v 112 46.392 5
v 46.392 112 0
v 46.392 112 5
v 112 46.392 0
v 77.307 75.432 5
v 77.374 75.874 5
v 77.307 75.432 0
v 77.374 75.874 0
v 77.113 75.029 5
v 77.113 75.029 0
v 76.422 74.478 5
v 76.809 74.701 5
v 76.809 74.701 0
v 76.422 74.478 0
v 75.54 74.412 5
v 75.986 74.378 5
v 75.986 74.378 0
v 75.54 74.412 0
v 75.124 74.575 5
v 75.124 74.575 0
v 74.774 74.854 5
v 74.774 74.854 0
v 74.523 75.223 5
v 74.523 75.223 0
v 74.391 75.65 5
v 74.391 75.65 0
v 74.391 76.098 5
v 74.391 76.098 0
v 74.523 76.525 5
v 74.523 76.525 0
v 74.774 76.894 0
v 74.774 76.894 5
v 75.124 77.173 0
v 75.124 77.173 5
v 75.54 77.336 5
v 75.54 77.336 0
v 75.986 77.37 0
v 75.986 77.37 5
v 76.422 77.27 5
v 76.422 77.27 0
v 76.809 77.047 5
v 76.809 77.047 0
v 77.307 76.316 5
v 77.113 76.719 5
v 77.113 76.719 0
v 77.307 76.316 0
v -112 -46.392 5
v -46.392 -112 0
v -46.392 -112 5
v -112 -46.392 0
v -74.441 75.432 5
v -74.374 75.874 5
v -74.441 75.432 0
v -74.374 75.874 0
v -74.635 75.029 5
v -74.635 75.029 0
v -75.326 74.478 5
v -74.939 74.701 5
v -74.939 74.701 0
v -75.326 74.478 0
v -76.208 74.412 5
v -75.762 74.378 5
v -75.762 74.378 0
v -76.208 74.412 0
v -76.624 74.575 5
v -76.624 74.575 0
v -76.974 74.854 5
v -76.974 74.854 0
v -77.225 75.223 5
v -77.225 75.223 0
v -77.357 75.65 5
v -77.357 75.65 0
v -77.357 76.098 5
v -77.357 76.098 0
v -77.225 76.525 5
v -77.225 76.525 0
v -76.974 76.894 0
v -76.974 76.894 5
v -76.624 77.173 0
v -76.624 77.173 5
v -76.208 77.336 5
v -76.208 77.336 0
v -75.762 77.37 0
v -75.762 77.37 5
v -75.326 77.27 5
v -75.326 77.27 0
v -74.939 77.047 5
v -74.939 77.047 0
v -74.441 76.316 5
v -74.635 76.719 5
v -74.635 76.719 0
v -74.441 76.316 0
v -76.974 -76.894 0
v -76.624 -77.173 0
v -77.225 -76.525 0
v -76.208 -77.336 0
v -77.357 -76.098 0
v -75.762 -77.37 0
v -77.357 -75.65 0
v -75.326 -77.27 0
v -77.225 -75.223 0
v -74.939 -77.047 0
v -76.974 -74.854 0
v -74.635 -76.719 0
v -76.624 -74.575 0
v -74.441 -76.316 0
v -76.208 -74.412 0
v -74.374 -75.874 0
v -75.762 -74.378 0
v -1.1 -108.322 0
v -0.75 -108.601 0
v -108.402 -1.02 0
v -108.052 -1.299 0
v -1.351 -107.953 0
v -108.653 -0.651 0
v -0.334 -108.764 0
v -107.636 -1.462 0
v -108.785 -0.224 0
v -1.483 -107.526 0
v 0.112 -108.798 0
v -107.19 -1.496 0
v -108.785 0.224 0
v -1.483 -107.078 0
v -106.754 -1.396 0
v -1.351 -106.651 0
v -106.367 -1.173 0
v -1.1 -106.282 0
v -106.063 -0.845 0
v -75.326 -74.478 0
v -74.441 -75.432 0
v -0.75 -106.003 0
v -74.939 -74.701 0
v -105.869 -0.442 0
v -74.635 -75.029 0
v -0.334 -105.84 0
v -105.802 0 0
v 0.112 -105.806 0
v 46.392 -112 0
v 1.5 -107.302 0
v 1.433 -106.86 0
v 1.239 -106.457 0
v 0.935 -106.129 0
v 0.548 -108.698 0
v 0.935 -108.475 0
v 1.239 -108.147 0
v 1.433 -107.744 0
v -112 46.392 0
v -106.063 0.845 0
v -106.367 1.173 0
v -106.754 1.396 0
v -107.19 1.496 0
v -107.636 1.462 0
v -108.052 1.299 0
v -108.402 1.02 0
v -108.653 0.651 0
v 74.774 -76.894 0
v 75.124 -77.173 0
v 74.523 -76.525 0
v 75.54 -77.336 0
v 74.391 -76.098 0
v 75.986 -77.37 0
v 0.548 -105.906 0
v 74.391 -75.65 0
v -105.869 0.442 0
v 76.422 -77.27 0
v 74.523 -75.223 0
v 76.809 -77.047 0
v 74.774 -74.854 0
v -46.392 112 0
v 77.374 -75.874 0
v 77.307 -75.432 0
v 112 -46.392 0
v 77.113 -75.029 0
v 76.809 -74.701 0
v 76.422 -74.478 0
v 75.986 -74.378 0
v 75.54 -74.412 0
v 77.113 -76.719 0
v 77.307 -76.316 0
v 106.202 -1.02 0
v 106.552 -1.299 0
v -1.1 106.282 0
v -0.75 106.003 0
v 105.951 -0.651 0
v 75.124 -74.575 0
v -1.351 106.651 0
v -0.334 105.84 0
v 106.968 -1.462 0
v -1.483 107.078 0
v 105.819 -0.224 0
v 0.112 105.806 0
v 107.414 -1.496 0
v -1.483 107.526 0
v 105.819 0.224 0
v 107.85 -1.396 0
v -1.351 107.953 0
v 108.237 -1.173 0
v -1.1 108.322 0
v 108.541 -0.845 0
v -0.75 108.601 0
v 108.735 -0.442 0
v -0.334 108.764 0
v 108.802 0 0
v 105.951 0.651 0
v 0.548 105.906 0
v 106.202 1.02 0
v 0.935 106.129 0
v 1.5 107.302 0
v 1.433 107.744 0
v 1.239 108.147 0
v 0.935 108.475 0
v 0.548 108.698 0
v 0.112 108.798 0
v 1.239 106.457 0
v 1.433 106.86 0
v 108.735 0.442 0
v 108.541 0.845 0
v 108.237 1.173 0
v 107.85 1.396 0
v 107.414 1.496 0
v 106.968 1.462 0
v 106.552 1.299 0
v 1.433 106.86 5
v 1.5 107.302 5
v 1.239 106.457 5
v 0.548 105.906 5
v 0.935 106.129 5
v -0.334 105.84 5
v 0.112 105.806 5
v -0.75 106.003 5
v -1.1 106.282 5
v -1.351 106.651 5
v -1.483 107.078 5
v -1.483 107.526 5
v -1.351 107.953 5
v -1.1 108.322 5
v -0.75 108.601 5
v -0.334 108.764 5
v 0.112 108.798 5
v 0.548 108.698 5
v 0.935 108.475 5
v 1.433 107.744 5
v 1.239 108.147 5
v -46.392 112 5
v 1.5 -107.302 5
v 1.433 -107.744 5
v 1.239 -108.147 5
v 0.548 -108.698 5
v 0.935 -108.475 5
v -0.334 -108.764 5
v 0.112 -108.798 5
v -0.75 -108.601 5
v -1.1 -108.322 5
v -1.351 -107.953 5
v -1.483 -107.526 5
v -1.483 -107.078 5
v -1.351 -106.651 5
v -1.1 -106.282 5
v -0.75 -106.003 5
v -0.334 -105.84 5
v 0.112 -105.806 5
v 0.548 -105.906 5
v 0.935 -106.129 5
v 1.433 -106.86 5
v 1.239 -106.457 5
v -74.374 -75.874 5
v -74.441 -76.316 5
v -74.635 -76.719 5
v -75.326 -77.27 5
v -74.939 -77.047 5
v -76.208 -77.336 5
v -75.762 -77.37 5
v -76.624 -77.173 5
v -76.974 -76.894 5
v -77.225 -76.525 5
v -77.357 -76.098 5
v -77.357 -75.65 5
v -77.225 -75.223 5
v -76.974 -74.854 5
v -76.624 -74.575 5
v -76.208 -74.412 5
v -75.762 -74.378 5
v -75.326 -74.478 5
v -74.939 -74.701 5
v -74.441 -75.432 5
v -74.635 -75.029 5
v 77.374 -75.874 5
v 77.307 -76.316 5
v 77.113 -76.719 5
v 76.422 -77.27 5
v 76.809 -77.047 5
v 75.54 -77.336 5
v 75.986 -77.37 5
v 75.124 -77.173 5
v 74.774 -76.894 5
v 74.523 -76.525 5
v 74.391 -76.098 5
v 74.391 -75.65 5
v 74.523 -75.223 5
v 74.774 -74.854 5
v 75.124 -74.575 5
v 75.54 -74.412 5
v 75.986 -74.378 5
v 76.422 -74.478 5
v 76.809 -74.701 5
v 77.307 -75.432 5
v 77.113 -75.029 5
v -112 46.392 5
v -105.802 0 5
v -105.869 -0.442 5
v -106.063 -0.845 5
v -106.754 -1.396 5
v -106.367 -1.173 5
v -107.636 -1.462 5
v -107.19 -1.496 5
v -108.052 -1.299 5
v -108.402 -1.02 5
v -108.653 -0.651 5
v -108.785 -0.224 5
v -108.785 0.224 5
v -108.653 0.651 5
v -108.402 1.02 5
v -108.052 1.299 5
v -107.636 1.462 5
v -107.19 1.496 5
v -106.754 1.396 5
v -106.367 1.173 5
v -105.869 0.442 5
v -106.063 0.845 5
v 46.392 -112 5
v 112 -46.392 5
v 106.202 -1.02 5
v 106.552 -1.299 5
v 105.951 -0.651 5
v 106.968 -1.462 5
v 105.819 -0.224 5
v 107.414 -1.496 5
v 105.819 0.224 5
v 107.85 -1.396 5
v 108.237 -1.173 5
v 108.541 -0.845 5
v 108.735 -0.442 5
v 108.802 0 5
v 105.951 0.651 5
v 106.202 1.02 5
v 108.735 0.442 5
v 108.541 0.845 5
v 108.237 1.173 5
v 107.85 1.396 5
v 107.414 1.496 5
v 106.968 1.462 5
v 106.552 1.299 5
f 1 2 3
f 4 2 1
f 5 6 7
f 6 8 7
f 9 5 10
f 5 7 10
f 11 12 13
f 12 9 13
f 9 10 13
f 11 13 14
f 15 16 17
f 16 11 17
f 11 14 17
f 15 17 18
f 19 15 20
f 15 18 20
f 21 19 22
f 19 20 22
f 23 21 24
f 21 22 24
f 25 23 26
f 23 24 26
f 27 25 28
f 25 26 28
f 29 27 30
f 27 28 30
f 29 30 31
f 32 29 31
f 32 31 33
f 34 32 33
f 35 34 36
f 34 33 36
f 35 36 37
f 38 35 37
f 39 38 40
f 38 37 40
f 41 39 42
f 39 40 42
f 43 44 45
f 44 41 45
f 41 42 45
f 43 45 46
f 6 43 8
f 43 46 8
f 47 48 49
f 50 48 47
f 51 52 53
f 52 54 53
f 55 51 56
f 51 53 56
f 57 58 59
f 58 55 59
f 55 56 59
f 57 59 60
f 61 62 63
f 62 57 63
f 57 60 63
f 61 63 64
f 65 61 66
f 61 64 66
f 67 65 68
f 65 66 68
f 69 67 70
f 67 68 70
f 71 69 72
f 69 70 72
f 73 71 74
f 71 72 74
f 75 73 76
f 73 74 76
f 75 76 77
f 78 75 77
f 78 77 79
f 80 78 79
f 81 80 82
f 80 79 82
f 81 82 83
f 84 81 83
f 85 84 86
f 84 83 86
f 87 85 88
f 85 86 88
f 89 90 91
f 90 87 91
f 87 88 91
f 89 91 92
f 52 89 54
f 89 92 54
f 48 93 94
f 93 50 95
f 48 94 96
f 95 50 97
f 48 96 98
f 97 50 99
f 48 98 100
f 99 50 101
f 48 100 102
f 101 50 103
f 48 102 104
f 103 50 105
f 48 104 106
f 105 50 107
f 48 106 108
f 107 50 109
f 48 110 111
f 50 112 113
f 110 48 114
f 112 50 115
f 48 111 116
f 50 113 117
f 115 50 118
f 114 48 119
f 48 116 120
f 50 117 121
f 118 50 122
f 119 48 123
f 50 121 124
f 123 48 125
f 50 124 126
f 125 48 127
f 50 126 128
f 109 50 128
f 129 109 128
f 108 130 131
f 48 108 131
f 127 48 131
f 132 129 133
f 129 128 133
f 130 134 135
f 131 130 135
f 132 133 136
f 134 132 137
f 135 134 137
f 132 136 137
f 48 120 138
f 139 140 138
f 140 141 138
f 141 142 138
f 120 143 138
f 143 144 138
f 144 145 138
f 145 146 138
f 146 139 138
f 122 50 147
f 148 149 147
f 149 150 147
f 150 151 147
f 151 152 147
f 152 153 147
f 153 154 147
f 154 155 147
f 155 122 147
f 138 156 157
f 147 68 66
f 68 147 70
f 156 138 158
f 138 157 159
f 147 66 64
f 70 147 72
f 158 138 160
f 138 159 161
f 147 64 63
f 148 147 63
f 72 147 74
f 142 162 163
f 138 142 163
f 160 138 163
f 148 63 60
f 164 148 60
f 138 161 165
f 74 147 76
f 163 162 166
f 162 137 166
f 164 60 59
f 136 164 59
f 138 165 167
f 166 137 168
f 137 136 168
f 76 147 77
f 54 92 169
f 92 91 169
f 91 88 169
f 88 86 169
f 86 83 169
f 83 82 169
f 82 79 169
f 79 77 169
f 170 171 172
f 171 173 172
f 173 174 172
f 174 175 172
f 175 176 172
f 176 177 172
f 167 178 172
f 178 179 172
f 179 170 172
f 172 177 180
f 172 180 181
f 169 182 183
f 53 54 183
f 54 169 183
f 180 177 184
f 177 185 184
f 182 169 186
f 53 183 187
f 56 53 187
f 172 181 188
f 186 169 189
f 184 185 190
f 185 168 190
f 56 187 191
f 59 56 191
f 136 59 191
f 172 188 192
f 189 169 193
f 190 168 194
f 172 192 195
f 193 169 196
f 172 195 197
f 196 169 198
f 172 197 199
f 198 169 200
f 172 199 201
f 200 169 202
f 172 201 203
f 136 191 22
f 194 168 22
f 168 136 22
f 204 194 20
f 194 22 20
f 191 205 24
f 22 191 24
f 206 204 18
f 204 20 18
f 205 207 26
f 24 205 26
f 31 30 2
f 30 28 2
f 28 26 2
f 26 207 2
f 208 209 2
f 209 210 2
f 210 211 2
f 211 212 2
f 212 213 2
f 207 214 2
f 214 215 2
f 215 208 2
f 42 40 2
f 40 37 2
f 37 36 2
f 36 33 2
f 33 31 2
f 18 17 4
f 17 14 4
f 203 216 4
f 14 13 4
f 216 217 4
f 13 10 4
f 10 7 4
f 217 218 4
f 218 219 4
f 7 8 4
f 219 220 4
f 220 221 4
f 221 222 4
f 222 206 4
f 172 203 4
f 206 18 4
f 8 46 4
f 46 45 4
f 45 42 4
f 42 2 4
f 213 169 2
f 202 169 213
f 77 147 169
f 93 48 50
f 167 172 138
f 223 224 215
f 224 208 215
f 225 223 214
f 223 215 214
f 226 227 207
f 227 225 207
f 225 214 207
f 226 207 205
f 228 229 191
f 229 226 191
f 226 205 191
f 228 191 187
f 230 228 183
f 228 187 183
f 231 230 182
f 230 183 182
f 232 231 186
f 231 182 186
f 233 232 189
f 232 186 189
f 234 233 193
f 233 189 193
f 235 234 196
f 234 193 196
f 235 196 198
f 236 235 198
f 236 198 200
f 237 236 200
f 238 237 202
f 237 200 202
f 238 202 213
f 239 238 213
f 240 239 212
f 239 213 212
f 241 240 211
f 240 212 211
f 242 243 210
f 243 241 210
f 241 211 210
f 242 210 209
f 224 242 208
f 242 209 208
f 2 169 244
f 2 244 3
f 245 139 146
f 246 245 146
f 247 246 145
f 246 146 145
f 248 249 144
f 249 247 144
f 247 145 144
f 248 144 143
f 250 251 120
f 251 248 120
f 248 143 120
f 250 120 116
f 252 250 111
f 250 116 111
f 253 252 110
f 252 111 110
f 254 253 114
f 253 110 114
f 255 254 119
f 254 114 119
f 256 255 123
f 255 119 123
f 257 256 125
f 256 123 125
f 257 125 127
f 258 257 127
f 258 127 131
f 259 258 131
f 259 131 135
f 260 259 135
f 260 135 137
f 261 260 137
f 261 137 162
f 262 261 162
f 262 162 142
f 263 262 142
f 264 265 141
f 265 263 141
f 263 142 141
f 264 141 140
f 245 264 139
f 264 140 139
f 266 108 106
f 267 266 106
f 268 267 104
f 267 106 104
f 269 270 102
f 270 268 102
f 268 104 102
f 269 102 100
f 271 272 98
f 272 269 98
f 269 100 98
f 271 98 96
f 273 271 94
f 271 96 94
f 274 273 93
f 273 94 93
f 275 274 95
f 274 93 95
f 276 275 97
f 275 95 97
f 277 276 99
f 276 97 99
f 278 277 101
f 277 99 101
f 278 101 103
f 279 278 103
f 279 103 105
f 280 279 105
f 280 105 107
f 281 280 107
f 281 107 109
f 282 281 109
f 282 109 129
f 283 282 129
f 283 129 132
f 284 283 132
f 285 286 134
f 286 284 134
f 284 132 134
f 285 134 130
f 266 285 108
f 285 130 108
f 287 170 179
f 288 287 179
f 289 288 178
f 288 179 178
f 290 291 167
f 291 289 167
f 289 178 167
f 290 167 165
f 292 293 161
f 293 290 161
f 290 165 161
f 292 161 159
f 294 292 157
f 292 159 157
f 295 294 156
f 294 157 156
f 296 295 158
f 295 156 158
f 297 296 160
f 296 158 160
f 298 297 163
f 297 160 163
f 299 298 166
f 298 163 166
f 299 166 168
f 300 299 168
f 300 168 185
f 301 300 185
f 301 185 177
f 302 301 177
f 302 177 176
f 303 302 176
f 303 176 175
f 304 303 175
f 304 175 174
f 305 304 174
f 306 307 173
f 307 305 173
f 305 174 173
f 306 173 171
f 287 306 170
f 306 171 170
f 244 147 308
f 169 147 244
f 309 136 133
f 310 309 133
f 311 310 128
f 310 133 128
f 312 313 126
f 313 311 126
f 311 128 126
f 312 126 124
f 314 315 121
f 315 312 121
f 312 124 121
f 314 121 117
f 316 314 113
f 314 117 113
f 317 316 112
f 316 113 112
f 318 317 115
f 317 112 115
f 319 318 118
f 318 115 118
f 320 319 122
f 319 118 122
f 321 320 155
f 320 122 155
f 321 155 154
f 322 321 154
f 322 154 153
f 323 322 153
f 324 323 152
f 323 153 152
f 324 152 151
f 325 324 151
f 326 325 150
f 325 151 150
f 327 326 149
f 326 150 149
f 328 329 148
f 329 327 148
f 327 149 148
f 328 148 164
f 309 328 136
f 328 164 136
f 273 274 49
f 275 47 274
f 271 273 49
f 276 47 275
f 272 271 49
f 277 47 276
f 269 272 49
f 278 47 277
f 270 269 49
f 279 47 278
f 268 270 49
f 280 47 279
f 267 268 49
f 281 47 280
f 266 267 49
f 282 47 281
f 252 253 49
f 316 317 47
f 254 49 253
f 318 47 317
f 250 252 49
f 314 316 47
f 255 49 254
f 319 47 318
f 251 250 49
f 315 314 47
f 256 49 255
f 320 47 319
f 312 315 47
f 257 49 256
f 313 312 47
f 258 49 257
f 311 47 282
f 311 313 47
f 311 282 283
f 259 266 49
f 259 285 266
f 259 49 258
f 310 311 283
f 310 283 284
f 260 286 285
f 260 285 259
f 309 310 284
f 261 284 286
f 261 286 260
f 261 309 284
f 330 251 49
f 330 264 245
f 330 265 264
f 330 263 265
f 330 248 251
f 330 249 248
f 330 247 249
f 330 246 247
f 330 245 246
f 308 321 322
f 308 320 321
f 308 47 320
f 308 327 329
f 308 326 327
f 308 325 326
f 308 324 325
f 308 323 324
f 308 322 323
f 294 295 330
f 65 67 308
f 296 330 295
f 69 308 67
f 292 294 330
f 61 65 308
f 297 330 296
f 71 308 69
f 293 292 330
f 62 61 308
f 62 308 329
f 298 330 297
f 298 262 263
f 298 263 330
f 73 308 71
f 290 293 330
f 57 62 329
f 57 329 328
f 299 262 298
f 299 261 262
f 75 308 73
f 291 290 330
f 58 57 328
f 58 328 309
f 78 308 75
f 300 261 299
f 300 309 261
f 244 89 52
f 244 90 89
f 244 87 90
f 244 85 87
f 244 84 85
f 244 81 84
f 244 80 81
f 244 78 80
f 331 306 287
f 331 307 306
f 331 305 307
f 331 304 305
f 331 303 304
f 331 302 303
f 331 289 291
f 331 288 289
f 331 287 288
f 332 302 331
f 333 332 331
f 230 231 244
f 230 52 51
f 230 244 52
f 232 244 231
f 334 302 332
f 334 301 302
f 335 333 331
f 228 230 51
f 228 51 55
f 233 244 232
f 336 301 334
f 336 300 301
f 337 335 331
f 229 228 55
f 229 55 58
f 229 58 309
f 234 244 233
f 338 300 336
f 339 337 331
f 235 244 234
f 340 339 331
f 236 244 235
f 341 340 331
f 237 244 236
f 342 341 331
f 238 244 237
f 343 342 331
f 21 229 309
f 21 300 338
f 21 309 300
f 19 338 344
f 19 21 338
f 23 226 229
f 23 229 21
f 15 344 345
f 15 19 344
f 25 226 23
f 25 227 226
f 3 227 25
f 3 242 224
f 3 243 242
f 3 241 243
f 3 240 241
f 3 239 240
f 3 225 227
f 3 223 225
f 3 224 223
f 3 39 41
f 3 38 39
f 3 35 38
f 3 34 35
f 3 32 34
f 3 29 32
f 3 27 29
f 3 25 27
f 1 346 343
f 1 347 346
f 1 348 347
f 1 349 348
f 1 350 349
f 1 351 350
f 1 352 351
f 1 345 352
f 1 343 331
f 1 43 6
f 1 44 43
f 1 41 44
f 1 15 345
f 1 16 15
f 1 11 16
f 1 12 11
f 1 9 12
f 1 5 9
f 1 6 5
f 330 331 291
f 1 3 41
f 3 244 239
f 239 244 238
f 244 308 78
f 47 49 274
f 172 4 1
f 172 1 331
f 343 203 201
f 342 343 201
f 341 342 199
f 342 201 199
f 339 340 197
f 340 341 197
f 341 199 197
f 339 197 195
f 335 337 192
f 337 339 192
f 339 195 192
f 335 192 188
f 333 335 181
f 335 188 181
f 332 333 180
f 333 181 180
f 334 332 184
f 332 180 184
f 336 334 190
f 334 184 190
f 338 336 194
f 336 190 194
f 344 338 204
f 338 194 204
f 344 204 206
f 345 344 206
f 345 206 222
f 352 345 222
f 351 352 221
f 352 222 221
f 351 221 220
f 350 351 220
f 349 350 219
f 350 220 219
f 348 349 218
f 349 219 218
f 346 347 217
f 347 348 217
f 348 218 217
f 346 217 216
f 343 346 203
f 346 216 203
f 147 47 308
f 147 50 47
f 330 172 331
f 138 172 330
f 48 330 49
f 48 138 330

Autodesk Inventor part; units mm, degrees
ref_plane "YZ Plane" through (0, 0, 0) normal (1, 0, 0) x (0, 1, 0)
ref_plane "XZ Plane" through (0, 0, 0) normal (0, 1, 0) x (-1, 0, 0)
ref_plane "XY Plane" through (0, 0, 0) normal (0, 0, 1) x (1, 0, 0)
sketch "스케치1" plane through (0, 0, 0) normal (0, 0, 1) x (1, 0, 0)
  line L0 (112, -46.3919) -> (46.3919, -112)
  line L1 (46.3919, -112) -> (-46.3919, -112)
  line L2 (-46.3919, -112) -> (-112, -46.3919)
  line L3 (-112, -46.3919) -> (-112, 46.3919)
  line L4 (-112, 46.3919) -> (-46.3919, 112)
  line L5 (-46.3919, 112) -> (46.3919, 112)
  line L6 (46.3919, 112) -> (112, 46.3919)
  line L7 (112, 46.3919) -> (112, -46.3919)
  line L8 (0, 0) -> (-9.429, 0)
  line L9 (0, 0) -> (-9.429, 0)
  circle A0 centre (0, 107.302) radius 1.5
  circle A1 centre (-75.874, 75.874) radius 1.5
  circle A2 centre (-107.302, 0) radius 1.5
  circle A3 centre (-75.874, -75.874) radius 1.5
  circle A4 centre (0, -107.302) radius 1.5
  circle A5 centre (75.874, -75.874) radius 1.5
  circle A6 centre (107.302, 0) radius 1.5
  circle A7 centre (75.874, 75.874) radius 1.5
  dimension "d0" = 224
  dimension "d1" = 3
  dimension "d2" = 4.698
  dimension "d5" = 360
extrude "돌출1" add sketch "스케치1" along normal blind 5
properties part number "Cap"
